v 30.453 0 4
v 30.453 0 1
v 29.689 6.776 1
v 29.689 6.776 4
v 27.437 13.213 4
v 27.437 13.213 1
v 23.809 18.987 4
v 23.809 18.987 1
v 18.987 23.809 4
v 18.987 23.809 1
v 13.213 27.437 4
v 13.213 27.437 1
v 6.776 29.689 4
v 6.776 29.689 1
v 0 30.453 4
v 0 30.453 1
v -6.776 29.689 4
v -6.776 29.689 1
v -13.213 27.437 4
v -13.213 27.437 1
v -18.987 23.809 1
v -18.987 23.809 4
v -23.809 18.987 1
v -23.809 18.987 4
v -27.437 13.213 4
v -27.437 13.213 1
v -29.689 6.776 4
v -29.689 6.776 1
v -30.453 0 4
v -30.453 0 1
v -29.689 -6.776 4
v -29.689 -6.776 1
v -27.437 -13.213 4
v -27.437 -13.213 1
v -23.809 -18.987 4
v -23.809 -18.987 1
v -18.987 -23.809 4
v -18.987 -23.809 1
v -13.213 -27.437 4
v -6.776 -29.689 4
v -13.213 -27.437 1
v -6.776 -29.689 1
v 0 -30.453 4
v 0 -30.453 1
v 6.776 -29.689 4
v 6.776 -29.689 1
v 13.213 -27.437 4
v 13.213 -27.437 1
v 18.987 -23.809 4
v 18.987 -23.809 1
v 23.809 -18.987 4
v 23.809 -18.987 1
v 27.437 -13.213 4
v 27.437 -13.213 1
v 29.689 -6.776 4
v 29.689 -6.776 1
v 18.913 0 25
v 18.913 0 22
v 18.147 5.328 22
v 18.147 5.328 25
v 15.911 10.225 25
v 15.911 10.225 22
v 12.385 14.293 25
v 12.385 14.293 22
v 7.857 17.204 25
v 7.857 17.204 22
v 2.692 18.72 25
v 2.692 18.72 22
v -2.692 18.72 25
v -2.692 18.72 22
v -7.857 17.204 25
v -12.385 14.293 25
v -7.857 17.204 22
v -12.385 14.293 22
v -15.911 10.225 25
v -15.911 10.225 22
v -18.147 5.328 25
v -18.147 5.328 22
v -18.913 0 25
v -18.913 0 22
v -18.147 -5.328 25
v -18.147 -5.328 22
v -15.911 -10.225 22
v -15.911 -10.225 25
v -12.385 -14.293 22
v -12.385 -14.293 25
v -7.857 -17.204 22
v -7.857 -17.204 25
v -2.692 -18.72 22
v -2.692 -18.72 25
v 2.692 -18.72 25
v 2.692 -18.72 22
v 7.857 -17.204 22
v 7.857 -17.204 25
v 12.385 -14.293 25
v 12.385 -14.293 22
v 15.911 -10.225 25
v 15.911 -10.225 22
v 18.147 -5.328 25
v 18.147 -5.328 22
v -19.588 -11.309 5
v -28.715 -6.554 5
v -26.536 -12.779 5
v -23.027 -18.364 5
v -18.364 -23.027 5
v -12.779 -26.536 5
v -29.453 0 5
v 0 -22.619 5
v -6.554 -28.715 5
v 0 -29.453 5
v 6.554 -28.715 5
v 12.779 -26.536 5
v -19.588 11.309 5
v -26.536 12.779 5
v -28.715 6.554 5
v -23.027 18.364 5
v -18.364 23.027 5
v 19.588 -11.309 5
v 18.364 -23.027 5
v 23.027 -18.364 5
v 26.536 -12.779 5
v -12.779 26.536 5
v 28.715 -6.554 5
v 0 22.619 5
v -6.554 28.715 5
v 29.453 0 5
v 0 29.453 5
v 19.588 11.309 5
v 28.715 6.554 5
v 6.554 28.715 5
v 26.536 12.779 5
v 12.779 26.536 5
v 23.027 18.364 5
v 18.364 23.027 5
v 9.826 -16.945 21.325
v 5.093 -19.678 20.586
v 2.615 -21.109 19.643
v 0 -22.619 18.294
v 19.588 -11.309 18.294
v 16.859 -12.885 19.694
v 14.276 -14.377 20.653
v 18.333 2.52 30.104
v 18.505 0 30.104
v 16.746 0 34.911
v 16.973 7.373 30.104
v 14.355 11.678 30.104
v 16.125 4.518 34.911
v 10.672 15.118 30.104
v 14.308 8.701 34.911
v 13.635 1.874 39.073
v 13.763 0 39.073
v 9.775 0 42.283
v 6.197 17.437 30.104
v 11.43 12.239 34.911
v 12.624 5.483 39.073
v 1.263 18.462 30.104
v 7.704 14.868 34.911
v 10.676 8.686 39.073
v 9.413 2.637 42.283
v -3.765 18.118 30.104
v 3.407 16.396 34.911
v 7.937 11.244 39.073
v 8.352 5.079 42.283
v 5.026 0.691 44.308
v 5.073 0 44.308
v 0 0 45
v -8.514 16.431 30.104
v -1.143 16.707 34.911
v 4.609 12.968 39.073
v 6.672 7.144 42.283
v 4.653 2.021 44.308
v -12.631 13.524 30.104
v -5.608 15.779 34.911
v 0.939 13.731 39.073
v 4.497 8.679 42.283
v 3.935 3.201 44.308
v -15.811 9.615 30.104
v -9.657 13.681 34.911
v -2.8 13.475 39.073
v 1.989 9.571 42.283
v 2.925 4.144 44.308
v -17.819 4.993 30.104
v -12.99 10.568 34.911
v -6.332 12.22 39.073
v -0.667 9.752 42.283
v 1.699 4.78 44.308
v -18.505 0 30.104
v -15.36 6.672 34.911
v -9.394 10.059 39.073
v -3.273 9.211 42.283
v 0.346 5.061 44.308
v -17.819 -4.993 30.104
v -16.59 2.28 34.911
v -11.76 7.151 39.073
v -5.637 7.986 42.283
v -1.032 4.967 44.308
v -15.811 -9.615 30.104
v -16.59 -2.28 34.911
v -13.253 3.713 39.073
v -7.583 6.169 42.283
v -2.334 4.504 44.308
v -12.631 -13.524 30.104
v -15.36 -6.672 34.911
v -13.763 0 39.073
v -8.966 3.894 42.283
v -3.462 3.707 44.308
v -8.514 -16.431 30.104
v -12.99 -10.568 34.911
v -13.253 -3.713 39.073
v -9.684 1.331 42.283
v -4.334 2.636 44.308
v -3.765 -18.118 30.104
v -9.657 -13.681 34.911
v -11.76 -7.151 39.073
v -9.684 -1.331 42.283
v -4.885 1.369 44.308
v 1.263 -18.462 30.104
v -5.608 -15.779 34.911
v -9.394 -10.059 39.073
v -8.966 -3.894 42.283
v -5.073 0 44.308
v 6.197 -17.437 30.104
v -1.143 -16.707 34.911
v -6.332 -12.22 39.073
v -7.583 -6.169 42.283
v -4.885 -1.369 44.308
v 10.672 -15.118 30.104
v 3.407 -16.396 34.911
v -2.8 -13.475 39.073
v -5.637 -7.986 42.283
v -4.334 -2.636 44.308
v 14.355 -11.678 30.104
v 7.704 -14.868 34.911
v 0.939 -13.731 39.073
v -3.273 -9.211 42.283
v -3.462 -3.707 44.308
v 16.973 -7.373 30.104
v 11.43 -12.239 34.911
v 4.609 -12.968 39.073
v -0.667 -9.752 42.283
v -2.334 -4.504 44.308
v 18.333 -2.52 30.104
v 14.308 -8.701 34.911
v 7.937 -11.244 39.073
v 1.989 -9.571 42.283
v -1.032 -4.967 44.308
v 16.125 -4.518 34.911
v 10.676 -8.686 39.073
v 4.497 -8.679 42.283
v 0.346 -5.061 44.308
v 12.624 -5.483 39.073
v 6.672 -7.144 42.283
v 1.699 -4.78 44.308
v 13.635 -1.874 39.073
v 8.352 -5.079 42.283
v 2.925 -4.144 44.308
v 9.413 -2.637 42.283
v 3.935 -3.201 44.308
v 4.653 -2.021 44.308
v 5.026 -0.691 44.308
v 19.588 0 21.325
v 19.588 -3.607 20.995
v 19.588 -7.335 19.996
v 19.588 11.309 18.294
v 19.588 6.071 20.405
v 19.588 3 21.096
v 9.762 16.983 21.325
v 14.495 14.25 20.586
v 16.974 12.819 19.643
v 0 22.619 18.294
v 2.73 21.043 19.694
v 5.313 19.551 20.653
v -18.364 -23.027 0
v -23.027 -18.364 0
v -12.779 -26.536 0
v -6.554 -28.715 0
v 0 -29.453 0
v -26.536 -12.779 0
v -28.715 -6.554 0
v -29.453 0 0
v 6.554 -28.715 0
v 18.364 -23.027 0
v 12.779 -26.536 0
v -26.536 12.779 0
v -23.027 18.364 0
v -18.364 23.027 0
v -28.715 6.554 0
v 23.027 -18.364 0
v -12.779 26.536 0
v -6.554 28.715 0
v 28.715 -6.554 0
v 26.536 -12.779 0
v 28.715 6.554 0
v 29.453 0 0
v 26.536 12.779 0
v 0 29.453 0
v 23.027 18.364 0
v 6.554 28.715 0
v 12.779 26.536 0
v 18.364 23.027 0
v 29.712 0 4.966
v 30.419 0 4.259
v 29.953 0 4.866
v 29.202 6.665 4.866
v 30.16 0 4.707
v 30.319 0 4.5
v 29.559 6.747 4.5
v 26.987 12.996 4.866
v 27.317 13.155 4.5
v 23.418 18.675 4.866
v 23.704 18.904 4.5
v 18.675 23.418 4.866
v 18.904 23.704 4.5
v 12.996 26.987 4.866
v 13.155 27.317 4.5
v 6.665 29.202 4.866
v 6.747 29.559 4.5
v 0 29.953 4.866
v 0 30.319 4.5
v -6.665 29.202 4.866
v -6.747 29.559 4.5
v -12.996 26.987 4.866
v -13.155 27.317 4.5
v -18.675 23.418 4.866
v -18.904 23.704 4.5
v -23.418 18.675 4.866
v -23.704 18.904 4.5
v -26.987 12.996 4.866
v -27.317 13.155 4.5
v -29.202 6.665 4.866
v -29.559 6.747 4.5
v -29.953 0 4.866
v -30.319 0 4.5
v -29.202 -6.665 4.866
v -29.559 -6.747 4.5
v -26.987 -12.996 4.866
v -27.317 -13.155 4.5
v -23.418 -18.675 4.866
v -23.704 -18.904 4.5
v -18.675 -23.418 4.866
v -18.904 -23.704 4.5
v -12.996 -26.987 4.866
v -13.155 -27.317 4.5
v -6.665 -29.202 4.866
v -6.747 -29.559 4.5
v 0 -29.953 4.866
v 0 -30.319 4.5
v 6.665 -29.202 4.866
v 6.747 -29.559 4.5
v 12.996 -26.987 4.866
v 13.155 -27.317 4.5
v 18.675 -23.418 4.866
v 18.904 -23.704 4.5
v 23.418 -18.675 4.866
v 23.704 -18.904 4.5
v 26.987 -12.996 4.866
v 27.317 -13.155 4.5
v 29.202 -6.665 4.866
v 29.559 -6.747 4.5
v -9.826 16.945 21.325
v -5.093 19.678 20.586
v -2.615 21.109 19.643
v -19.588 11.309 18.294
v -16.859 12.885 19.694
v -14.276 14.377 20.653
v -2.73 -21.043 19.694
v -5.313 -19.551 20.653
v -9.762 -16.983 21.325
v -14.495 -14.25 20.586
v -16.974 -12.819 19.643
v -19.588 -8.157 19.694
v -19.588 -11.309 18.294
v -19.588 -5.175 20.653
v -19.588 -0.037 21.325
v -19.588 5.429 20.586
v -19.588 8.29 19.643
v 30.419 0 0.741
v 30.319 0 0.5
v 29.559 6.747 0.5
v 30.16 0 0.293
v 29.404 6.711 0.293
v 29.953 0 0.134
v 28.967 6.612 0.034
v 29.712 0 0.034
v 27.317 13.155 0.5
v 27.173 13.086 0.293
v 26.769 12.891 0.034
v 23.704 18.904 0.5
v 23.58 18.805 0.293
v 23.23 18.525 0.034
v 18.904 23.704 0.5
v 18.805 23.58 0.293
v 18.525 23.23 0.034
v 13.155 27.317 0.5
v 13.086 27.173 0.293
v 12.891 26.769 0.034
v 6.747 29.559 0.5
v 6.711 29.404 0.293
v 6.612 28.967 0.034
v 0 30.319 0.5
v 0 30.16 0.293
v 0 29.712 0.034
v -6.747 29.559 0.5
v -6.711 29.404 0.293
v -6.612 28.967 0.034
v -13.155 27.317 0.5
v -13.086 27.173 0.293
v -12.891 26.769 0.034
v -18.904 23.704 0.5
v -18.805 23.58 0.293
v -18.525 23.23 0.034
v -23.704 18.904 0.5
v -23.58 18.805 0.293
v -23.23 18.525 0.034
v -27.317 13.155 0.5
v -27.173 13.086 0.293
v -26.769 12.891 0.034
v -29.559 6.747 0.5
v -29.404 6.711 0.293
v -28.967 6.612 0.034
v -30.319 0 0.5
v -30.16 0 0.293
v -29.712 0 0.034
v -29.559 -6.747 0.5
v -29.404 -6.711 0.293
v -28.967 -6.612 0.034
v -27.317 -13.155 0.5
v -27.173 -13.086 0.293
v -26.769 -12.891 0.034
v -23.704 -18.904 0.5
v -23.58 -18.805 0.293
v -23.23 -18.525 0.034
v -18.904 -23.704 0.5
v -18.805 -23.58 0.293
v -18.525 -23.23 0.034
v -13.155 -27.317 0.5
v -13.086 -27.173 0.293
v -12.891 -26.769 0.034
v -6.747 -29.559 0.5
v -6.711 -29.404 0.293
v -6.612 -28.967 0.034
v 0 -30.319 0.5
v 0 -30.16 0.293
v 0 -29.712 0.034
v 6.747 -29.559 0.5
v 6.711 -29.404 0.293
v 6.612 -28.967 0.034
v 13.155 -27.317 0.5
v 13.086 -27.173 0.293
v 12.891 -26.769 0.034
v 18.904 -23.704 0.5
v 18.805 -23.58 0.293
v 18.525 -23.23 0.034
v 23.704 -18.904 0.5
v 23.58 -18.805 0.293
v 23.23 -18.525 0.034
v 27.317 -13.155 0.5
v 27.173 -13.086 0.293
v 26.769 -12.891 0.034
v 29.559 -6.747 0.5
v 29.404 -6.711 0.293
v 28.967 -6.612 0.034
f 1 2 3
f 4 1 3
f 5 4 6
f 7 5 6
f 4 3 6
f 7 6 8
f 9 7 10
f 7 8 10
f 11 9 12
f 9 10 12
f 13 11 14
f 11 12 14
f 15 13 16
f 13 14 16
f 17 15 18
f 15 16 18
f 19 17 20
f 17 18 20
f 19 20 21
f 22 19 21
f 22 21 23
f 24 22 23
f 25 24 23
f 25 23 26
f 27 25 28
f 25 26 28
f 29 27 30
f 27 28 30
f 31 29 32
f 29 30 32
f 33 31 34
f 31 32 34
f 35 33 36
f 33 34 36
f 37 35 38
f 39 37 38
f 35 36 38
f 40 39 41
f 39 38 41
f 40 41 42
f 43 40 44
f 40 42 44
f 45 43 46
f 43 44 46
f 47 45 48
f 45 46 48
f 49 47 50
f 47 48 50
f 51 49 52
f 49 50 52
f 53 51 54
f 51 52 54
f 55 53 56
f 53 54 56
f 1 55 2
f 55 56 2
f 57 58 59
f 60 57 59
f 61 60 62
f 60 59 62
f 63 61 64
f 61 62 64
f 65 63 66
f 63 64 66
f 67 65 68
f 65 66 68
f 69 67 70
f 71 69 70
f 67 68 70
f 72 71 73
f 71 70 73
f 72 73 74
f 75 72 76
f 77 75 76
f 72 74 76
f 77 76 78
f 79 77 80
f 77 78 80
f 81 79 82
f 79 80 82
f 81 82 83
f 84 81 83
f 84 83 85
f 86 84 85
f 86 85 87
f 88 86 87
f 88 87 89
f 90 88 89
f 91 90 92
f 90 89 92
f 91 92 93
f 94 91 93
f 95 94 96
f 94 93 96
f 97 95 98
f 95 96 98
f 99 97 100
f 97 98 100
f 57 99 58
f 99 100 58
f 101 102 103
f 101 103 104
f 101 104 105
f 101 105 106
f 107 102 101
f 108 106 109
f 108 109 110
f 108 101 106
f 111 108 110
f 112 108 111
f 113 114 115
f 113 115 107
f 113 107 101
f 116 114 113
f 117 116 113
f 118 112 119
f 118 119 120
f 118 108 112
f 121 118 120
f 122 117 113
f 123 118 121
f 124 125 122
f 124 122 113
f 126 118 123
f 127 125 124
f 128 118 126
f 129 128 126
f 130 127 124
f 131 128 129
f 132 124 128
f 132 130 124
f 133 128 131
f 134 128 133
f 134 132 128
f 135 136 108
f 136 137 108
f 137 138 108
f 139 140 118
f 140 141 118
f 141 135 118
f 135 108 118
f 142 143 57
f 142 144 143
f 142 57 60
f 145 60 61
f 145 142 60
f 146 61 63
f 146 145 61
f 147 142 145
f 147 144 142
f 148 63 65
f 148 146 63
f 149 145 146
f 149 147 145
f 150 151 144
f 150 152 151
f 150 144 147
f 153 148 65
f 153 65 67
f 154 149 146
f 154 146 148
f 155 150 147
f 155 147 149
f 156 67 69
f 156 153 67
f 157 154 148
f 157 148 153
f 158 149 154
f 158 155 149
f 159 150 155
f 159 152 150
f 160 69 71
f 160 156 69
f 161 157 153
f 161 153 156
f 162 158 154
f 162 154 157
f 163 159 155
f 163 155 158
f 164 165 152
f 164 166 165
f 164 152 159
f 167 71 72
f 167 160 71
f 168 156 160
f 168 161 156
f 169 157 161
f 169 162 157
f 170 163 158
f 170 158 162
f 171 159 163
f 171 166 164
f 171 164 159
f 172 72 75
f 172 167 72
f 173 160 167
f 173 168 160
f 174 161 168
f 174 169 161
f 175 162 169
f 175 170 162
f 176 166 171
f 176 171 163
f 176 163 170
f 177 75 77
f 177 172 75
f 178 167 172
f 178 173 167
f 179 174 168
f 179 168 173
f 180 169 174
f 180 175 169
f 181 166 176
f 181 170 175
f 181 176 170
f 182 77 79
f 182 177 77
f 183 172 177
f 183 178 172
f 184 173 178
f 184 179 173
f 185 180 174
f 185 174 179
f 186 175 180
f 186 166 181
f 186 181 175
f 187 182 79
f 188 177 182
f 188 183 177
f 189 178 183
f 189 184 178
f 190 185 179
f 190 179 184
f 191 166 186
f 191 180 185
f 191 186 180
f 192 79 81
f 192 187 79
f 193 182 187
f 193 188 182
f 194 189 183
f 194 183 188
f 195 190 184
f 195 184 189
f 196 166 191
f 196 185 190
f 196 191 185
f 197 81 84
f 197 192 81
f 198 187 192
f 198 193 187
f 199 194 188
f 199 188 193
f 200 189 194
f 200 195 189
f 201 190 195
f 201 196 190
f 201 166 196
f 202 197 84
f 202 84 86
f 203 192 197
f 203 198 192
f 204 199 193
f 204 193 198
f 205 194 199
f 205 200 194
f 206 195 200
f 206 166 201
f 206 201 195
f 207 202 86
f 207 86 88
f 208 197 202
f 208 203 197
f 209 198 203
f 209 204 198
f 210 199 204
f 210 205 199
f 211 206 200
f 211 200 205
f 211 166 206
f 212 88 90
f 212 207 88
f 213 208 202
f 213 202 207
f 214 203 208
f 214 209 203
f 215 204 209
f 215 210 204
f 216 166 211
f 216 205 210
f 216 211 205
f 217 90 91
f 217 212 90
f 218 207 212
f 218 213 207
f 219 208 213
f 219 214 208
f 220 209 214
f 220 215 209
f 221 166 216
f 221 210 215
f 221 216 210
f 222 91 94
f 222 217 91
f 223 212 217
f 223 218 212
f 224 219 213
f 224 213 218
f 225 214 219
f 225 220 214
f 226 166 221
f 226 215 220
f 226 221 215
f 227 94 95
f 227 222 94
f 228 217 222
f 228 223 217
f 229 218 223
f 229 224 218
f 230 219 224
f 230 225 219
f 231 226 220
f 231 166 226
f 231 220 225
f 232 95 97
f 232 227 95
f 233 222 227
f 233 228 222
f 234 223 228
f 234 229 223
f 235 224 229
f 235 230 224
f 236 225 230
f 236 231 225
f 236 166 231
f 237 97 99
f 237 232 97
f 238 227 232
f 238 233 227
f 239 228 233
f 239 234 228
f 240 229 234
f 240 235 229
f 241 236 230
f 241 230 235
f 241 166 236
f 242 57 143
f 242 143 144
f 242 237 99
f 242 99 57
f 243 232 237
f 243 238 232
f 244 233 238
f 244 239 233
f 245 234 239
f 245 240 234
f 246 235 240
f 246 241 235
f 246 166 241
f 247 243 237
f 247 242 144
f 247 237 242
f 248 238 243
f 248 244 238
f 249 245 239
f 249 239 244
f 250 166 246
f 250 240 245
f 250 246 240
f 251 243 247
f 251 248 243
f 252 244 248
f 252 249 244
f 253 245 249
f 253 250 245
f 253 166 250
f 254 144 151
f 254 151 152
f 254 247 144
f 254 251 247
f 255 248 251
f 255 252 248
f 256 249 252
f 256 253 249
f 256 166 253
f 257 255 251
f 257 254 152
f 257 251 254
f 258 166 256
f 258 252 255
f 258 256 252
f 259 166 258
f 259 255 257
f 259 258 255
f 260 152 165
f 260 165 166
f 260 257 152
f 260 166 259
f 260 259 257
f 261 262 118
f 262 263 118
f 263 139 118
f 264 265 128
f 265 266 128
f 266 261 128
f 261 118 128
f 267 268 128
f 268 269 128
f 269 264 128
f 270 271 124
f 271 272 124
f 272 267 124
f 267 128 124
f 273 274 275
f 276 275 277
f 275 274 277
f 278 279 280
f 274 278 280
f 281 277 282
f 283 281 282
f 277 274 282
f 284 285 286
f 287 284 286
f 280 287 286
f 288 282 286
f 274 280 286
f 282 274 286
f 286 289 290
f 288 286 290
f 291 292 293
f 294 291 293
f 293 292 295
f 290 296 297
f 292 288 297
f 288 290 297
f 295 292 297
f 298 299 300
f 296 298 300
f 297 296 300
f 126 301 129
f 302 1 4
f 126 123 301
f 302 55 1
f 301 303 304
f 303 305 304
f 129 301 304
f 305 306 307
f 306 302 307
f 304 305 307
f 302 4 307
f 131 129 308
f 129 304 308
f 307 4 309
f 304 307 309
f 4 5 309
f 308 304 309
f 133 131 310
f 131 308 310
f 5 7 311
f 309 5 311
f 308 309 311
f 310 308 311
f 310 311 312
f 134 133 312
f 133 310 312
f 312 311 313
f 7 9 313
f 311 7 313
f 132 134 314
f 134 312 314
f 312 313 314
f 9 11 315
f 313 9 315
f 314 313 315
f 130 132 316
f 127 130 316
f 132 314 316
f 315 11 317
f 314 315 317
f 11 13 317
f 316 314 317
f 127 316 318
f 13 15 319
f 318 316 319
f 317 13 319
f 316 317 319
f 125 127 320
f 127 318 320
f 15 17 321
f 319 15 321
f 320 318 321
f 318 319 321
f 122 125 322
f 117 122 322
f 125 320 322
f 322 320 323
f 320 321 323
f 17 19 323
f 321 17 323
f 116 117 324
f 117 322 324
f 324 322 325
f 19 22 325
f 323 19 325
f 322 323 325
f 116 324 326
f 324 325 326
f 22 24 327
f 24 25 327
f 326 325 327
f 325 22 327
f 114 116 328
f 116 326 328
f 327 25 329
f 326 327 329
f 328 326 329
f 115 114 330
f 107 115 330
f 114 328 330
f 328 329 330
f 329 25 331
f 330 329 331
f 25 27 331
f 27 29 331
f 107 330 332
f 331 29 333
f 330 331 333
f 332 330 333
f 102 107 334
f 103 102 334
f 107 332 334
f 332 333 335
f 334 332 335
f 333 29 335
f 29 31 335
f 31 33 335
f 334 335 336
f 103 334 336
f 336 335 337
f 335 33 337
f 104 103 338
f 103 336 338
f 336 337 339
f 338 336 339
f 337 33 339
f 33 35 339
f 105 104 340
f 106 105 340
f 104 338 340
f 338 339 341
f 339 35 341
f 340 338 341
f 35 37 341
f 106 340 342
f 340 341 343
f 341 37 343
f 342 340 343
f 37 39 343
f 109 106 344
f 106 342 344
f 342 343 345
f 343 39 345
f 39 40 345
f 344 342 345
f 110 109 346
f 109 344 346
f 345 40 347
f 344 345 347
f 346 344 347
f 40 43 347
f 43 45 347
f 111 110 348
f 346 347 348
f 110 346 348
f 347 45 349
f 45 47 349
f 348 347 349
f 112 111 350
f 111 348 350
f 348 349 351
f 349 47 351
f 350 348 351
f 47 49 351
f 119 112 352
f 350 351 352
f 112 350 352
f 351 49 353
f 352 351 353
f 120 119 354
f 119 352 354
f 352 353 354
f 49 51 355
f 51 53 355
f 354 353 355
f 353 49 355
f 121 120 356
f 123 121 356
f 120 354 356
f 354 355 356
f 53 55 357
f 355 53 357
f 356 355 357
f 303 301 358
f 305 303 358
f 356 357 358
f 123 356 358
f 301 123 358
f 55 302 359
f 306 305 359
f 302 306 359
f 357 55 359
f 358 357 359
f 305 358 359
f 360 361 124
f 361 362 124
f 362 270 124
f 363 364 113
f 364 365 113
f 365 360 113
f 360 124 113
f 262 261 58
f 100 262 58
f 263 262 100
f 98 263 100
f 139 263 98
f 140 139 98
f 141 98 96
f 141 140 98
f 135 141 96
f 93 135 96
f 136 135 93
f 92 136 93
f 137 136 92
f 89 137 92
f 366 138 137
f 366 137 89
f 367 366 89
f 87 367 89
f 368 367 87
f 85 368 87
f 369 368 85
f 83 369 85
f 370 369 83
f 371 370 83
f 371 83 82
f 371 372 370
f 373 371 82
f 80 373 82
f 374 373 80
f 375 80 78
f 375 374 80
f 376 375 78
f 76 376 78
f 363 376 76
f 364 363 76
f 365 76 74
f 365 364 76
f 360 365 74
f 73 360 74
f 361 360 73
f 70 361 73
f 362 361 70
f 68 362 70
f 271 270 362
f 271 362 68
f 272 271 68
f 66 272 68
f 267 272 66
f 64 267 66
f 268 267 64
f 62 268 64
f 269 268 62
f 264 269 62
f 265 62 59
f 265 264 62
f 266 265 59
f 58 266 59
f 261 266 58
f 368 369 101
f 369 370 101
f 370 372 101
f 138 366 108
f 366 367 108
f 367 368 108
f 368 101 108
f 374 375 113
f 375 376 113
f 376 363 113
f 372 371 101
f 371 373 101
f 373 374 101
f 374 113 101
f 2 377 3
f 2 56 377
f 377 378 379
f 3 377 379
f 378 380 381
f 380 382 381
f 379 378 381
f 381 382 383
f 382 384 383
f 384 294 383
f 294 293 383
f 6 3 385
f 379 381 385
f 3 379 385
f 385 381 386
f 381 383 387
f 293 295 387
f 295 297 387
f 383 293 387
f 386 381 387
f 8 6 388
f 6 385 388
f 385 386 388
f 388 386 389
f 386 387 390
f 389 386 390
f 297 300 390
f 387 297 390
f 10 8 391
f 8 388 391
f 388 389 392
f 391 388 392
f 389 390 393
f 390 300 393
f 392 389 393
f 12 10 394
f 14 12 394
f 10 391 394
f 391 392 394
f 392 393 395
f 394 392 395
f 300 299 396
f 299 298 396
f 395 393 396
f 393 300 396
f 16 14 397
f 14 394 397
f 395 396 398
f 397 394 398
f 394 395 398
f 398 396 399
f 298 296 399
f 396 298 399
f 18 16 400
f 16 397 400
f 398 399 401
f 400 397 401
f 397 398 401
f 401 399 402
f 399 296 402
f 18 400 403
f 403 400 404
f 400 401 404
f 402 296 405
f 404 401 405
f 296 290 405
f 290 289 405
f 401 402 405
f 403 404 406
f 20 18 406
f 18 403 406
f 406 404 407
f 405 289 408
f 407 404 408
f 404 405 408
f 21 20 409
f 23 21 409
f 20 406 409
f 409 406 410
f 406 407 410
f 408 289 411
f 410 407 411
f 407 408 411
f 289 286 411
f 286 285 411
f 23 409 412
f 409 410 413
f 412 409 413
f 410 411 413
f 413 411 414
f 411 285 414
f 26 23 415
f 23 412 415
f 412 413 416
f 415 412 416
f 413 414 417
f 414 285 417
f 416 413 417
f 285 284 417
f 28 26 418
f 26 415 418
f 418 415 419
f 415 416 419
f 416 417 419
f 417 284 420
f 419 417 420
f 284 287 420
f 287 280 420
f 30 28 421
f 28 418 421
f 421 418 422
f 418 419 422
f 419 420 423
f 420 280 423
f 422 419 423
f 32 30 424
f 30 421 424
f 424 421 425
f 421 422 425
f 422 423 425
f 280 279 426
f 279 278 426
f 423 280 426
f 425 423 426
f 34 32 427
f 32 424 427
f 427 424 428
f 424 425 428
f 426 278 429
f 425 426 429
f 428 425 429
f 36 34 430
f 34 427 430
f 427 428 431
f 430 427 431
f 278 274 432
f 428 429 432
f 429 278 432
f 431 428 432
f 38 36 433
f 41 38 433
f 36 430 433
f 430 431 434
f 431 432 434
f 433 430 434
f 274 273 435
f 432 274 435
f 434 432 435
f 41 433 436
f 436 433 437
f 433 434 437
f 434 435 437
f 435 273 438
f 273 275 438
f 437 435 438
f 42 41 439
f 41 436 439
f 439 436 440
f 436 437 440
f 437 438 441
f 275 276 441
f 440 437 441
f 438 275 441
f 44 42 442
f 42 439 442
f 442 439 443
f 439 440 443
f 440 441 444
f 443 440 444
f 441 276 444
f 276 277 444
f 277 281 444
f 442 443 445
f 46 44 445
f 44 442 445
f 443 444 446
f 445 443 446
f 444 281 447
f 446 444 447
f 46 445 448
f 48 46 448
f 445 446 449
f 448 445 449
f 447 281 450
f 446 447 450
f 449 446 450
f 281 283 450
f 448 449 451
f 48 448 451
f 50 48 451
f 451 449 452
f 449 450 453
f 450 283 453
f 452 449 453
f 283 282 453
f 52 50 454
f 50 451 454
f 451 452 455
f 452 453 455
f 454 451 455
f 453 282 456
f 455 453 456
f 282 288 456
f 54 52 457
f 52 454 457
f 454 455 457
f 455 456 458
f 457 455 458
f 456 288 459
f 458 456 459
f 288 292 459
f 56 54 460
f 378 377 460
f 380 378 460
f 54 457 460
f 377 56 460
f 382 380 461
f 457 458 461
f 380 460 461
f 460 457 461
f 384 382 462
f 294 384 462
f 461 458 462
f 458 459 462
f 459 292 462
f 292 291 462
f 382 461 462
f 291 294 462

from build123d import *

# Parameters (mm, degrees)
SKETCH1_R           = 30.453013084
BOSS_EXTRUDE1_DEPTH = 5
BOSS_EXTRUDE2_DEPTH = 17
SKETCH3_R           = 36.437835874
SKETCH3_R_2         = 18.912930376
CUT_EXTRUDE1_DEPTH  = 17
CUT_EXTRUDE1_TAPER  = 45
SKETCH4_R           = 18.912930376
BOSS_EXTRUDE3_DEPTH = 3
DOME1_FACE_RADIUS   = 18.912930376
DOME1_HEIGHT        = 20
FILLET1_R           = 1
FILLET2_R           = 1


with BuildPart() as part:
    # Sketch1 → Boss-Extrude1 (new body)
    with BuildSketch(Plane.XY):
        Circle(SKETCH1_R)
    extrude(amount=BOSS_EXTRUDE1_DEPTH)

    # Sketch2 → Boss-Extrude2 (add)
    with BuildSketch(Plane.XY.offset(5)):
        Polygon((0, 22.618579174), (-19.588264162, 11.309289587), (-19.588264162, -11.309289587), (0, -22.618579174), (19.588264162, -11.309289587), (19.588264162, 11.309289587), align=None)
    extrude(amount=BOSS_EXTRUDE2_DEPTH)

    # Sketch3 → Cut-Extrude1 (cut)
    with BuildSketch(Plane.XY.offset(22)):
        Circle(SKETCH3_R)
        Circle(SKETCH3_R_2, mode=Mode.SUBTRACT)
    extrude(amount=-CUT_EXTRUDE1_DEPTH, taper=CUT_EXTRUDE1_TAPER, mode=Mode.SUBTRACT)

    # Sketch4 → Boss-Extrude3 (add)
    with BuildSketch(Plane.XY.offset(22)):
        Circle(SKETCH4_R)
    extrude(amount=BOSS_EXTRUDE3_DEPTH)

    # Dome1: a dome of height H over a round flat face of radius A is a cap of a sphere of radius (A * A + H * H) / (2 * H)
    dome1_r = (DOME1_FACE_RADIUS * DOME1_FACE_RADIUS + DOME1_HEIGHT * DOME1_HEIGHT) / (2 * DOME1_HEIGHT)
    dome1_base = Plane((0, 0, 25), z_dir=(0, 0, 1))
    with Locations(dome1_base.offset(DOME1_HEIGHT - dome1_r)):
        dome1_ball = Sphere(dome1_r, mode=Mode.PRIVATE)
    add(split(dome1_ball, bisect_by=dome1_base, keep=Keep.TOP, mode=Mode.PRIVATE))

    # Fillet1
    fillet1_edges = [part.edges().sort_by_distance(p)[0] for p in [
        (-30.453013084, 0, 5),
    ]]
    fillet(fillet1_edges, radius=FILLET1_R)

    # Fillet2
    fillet2_edges = [part.edges().sort_by_distance(p)[0] for p in [
        (-30.453013084, 0, 0),
    ]]
    fillet(fillet2_edges, radius=FILLET2_R)


solid = part.part
